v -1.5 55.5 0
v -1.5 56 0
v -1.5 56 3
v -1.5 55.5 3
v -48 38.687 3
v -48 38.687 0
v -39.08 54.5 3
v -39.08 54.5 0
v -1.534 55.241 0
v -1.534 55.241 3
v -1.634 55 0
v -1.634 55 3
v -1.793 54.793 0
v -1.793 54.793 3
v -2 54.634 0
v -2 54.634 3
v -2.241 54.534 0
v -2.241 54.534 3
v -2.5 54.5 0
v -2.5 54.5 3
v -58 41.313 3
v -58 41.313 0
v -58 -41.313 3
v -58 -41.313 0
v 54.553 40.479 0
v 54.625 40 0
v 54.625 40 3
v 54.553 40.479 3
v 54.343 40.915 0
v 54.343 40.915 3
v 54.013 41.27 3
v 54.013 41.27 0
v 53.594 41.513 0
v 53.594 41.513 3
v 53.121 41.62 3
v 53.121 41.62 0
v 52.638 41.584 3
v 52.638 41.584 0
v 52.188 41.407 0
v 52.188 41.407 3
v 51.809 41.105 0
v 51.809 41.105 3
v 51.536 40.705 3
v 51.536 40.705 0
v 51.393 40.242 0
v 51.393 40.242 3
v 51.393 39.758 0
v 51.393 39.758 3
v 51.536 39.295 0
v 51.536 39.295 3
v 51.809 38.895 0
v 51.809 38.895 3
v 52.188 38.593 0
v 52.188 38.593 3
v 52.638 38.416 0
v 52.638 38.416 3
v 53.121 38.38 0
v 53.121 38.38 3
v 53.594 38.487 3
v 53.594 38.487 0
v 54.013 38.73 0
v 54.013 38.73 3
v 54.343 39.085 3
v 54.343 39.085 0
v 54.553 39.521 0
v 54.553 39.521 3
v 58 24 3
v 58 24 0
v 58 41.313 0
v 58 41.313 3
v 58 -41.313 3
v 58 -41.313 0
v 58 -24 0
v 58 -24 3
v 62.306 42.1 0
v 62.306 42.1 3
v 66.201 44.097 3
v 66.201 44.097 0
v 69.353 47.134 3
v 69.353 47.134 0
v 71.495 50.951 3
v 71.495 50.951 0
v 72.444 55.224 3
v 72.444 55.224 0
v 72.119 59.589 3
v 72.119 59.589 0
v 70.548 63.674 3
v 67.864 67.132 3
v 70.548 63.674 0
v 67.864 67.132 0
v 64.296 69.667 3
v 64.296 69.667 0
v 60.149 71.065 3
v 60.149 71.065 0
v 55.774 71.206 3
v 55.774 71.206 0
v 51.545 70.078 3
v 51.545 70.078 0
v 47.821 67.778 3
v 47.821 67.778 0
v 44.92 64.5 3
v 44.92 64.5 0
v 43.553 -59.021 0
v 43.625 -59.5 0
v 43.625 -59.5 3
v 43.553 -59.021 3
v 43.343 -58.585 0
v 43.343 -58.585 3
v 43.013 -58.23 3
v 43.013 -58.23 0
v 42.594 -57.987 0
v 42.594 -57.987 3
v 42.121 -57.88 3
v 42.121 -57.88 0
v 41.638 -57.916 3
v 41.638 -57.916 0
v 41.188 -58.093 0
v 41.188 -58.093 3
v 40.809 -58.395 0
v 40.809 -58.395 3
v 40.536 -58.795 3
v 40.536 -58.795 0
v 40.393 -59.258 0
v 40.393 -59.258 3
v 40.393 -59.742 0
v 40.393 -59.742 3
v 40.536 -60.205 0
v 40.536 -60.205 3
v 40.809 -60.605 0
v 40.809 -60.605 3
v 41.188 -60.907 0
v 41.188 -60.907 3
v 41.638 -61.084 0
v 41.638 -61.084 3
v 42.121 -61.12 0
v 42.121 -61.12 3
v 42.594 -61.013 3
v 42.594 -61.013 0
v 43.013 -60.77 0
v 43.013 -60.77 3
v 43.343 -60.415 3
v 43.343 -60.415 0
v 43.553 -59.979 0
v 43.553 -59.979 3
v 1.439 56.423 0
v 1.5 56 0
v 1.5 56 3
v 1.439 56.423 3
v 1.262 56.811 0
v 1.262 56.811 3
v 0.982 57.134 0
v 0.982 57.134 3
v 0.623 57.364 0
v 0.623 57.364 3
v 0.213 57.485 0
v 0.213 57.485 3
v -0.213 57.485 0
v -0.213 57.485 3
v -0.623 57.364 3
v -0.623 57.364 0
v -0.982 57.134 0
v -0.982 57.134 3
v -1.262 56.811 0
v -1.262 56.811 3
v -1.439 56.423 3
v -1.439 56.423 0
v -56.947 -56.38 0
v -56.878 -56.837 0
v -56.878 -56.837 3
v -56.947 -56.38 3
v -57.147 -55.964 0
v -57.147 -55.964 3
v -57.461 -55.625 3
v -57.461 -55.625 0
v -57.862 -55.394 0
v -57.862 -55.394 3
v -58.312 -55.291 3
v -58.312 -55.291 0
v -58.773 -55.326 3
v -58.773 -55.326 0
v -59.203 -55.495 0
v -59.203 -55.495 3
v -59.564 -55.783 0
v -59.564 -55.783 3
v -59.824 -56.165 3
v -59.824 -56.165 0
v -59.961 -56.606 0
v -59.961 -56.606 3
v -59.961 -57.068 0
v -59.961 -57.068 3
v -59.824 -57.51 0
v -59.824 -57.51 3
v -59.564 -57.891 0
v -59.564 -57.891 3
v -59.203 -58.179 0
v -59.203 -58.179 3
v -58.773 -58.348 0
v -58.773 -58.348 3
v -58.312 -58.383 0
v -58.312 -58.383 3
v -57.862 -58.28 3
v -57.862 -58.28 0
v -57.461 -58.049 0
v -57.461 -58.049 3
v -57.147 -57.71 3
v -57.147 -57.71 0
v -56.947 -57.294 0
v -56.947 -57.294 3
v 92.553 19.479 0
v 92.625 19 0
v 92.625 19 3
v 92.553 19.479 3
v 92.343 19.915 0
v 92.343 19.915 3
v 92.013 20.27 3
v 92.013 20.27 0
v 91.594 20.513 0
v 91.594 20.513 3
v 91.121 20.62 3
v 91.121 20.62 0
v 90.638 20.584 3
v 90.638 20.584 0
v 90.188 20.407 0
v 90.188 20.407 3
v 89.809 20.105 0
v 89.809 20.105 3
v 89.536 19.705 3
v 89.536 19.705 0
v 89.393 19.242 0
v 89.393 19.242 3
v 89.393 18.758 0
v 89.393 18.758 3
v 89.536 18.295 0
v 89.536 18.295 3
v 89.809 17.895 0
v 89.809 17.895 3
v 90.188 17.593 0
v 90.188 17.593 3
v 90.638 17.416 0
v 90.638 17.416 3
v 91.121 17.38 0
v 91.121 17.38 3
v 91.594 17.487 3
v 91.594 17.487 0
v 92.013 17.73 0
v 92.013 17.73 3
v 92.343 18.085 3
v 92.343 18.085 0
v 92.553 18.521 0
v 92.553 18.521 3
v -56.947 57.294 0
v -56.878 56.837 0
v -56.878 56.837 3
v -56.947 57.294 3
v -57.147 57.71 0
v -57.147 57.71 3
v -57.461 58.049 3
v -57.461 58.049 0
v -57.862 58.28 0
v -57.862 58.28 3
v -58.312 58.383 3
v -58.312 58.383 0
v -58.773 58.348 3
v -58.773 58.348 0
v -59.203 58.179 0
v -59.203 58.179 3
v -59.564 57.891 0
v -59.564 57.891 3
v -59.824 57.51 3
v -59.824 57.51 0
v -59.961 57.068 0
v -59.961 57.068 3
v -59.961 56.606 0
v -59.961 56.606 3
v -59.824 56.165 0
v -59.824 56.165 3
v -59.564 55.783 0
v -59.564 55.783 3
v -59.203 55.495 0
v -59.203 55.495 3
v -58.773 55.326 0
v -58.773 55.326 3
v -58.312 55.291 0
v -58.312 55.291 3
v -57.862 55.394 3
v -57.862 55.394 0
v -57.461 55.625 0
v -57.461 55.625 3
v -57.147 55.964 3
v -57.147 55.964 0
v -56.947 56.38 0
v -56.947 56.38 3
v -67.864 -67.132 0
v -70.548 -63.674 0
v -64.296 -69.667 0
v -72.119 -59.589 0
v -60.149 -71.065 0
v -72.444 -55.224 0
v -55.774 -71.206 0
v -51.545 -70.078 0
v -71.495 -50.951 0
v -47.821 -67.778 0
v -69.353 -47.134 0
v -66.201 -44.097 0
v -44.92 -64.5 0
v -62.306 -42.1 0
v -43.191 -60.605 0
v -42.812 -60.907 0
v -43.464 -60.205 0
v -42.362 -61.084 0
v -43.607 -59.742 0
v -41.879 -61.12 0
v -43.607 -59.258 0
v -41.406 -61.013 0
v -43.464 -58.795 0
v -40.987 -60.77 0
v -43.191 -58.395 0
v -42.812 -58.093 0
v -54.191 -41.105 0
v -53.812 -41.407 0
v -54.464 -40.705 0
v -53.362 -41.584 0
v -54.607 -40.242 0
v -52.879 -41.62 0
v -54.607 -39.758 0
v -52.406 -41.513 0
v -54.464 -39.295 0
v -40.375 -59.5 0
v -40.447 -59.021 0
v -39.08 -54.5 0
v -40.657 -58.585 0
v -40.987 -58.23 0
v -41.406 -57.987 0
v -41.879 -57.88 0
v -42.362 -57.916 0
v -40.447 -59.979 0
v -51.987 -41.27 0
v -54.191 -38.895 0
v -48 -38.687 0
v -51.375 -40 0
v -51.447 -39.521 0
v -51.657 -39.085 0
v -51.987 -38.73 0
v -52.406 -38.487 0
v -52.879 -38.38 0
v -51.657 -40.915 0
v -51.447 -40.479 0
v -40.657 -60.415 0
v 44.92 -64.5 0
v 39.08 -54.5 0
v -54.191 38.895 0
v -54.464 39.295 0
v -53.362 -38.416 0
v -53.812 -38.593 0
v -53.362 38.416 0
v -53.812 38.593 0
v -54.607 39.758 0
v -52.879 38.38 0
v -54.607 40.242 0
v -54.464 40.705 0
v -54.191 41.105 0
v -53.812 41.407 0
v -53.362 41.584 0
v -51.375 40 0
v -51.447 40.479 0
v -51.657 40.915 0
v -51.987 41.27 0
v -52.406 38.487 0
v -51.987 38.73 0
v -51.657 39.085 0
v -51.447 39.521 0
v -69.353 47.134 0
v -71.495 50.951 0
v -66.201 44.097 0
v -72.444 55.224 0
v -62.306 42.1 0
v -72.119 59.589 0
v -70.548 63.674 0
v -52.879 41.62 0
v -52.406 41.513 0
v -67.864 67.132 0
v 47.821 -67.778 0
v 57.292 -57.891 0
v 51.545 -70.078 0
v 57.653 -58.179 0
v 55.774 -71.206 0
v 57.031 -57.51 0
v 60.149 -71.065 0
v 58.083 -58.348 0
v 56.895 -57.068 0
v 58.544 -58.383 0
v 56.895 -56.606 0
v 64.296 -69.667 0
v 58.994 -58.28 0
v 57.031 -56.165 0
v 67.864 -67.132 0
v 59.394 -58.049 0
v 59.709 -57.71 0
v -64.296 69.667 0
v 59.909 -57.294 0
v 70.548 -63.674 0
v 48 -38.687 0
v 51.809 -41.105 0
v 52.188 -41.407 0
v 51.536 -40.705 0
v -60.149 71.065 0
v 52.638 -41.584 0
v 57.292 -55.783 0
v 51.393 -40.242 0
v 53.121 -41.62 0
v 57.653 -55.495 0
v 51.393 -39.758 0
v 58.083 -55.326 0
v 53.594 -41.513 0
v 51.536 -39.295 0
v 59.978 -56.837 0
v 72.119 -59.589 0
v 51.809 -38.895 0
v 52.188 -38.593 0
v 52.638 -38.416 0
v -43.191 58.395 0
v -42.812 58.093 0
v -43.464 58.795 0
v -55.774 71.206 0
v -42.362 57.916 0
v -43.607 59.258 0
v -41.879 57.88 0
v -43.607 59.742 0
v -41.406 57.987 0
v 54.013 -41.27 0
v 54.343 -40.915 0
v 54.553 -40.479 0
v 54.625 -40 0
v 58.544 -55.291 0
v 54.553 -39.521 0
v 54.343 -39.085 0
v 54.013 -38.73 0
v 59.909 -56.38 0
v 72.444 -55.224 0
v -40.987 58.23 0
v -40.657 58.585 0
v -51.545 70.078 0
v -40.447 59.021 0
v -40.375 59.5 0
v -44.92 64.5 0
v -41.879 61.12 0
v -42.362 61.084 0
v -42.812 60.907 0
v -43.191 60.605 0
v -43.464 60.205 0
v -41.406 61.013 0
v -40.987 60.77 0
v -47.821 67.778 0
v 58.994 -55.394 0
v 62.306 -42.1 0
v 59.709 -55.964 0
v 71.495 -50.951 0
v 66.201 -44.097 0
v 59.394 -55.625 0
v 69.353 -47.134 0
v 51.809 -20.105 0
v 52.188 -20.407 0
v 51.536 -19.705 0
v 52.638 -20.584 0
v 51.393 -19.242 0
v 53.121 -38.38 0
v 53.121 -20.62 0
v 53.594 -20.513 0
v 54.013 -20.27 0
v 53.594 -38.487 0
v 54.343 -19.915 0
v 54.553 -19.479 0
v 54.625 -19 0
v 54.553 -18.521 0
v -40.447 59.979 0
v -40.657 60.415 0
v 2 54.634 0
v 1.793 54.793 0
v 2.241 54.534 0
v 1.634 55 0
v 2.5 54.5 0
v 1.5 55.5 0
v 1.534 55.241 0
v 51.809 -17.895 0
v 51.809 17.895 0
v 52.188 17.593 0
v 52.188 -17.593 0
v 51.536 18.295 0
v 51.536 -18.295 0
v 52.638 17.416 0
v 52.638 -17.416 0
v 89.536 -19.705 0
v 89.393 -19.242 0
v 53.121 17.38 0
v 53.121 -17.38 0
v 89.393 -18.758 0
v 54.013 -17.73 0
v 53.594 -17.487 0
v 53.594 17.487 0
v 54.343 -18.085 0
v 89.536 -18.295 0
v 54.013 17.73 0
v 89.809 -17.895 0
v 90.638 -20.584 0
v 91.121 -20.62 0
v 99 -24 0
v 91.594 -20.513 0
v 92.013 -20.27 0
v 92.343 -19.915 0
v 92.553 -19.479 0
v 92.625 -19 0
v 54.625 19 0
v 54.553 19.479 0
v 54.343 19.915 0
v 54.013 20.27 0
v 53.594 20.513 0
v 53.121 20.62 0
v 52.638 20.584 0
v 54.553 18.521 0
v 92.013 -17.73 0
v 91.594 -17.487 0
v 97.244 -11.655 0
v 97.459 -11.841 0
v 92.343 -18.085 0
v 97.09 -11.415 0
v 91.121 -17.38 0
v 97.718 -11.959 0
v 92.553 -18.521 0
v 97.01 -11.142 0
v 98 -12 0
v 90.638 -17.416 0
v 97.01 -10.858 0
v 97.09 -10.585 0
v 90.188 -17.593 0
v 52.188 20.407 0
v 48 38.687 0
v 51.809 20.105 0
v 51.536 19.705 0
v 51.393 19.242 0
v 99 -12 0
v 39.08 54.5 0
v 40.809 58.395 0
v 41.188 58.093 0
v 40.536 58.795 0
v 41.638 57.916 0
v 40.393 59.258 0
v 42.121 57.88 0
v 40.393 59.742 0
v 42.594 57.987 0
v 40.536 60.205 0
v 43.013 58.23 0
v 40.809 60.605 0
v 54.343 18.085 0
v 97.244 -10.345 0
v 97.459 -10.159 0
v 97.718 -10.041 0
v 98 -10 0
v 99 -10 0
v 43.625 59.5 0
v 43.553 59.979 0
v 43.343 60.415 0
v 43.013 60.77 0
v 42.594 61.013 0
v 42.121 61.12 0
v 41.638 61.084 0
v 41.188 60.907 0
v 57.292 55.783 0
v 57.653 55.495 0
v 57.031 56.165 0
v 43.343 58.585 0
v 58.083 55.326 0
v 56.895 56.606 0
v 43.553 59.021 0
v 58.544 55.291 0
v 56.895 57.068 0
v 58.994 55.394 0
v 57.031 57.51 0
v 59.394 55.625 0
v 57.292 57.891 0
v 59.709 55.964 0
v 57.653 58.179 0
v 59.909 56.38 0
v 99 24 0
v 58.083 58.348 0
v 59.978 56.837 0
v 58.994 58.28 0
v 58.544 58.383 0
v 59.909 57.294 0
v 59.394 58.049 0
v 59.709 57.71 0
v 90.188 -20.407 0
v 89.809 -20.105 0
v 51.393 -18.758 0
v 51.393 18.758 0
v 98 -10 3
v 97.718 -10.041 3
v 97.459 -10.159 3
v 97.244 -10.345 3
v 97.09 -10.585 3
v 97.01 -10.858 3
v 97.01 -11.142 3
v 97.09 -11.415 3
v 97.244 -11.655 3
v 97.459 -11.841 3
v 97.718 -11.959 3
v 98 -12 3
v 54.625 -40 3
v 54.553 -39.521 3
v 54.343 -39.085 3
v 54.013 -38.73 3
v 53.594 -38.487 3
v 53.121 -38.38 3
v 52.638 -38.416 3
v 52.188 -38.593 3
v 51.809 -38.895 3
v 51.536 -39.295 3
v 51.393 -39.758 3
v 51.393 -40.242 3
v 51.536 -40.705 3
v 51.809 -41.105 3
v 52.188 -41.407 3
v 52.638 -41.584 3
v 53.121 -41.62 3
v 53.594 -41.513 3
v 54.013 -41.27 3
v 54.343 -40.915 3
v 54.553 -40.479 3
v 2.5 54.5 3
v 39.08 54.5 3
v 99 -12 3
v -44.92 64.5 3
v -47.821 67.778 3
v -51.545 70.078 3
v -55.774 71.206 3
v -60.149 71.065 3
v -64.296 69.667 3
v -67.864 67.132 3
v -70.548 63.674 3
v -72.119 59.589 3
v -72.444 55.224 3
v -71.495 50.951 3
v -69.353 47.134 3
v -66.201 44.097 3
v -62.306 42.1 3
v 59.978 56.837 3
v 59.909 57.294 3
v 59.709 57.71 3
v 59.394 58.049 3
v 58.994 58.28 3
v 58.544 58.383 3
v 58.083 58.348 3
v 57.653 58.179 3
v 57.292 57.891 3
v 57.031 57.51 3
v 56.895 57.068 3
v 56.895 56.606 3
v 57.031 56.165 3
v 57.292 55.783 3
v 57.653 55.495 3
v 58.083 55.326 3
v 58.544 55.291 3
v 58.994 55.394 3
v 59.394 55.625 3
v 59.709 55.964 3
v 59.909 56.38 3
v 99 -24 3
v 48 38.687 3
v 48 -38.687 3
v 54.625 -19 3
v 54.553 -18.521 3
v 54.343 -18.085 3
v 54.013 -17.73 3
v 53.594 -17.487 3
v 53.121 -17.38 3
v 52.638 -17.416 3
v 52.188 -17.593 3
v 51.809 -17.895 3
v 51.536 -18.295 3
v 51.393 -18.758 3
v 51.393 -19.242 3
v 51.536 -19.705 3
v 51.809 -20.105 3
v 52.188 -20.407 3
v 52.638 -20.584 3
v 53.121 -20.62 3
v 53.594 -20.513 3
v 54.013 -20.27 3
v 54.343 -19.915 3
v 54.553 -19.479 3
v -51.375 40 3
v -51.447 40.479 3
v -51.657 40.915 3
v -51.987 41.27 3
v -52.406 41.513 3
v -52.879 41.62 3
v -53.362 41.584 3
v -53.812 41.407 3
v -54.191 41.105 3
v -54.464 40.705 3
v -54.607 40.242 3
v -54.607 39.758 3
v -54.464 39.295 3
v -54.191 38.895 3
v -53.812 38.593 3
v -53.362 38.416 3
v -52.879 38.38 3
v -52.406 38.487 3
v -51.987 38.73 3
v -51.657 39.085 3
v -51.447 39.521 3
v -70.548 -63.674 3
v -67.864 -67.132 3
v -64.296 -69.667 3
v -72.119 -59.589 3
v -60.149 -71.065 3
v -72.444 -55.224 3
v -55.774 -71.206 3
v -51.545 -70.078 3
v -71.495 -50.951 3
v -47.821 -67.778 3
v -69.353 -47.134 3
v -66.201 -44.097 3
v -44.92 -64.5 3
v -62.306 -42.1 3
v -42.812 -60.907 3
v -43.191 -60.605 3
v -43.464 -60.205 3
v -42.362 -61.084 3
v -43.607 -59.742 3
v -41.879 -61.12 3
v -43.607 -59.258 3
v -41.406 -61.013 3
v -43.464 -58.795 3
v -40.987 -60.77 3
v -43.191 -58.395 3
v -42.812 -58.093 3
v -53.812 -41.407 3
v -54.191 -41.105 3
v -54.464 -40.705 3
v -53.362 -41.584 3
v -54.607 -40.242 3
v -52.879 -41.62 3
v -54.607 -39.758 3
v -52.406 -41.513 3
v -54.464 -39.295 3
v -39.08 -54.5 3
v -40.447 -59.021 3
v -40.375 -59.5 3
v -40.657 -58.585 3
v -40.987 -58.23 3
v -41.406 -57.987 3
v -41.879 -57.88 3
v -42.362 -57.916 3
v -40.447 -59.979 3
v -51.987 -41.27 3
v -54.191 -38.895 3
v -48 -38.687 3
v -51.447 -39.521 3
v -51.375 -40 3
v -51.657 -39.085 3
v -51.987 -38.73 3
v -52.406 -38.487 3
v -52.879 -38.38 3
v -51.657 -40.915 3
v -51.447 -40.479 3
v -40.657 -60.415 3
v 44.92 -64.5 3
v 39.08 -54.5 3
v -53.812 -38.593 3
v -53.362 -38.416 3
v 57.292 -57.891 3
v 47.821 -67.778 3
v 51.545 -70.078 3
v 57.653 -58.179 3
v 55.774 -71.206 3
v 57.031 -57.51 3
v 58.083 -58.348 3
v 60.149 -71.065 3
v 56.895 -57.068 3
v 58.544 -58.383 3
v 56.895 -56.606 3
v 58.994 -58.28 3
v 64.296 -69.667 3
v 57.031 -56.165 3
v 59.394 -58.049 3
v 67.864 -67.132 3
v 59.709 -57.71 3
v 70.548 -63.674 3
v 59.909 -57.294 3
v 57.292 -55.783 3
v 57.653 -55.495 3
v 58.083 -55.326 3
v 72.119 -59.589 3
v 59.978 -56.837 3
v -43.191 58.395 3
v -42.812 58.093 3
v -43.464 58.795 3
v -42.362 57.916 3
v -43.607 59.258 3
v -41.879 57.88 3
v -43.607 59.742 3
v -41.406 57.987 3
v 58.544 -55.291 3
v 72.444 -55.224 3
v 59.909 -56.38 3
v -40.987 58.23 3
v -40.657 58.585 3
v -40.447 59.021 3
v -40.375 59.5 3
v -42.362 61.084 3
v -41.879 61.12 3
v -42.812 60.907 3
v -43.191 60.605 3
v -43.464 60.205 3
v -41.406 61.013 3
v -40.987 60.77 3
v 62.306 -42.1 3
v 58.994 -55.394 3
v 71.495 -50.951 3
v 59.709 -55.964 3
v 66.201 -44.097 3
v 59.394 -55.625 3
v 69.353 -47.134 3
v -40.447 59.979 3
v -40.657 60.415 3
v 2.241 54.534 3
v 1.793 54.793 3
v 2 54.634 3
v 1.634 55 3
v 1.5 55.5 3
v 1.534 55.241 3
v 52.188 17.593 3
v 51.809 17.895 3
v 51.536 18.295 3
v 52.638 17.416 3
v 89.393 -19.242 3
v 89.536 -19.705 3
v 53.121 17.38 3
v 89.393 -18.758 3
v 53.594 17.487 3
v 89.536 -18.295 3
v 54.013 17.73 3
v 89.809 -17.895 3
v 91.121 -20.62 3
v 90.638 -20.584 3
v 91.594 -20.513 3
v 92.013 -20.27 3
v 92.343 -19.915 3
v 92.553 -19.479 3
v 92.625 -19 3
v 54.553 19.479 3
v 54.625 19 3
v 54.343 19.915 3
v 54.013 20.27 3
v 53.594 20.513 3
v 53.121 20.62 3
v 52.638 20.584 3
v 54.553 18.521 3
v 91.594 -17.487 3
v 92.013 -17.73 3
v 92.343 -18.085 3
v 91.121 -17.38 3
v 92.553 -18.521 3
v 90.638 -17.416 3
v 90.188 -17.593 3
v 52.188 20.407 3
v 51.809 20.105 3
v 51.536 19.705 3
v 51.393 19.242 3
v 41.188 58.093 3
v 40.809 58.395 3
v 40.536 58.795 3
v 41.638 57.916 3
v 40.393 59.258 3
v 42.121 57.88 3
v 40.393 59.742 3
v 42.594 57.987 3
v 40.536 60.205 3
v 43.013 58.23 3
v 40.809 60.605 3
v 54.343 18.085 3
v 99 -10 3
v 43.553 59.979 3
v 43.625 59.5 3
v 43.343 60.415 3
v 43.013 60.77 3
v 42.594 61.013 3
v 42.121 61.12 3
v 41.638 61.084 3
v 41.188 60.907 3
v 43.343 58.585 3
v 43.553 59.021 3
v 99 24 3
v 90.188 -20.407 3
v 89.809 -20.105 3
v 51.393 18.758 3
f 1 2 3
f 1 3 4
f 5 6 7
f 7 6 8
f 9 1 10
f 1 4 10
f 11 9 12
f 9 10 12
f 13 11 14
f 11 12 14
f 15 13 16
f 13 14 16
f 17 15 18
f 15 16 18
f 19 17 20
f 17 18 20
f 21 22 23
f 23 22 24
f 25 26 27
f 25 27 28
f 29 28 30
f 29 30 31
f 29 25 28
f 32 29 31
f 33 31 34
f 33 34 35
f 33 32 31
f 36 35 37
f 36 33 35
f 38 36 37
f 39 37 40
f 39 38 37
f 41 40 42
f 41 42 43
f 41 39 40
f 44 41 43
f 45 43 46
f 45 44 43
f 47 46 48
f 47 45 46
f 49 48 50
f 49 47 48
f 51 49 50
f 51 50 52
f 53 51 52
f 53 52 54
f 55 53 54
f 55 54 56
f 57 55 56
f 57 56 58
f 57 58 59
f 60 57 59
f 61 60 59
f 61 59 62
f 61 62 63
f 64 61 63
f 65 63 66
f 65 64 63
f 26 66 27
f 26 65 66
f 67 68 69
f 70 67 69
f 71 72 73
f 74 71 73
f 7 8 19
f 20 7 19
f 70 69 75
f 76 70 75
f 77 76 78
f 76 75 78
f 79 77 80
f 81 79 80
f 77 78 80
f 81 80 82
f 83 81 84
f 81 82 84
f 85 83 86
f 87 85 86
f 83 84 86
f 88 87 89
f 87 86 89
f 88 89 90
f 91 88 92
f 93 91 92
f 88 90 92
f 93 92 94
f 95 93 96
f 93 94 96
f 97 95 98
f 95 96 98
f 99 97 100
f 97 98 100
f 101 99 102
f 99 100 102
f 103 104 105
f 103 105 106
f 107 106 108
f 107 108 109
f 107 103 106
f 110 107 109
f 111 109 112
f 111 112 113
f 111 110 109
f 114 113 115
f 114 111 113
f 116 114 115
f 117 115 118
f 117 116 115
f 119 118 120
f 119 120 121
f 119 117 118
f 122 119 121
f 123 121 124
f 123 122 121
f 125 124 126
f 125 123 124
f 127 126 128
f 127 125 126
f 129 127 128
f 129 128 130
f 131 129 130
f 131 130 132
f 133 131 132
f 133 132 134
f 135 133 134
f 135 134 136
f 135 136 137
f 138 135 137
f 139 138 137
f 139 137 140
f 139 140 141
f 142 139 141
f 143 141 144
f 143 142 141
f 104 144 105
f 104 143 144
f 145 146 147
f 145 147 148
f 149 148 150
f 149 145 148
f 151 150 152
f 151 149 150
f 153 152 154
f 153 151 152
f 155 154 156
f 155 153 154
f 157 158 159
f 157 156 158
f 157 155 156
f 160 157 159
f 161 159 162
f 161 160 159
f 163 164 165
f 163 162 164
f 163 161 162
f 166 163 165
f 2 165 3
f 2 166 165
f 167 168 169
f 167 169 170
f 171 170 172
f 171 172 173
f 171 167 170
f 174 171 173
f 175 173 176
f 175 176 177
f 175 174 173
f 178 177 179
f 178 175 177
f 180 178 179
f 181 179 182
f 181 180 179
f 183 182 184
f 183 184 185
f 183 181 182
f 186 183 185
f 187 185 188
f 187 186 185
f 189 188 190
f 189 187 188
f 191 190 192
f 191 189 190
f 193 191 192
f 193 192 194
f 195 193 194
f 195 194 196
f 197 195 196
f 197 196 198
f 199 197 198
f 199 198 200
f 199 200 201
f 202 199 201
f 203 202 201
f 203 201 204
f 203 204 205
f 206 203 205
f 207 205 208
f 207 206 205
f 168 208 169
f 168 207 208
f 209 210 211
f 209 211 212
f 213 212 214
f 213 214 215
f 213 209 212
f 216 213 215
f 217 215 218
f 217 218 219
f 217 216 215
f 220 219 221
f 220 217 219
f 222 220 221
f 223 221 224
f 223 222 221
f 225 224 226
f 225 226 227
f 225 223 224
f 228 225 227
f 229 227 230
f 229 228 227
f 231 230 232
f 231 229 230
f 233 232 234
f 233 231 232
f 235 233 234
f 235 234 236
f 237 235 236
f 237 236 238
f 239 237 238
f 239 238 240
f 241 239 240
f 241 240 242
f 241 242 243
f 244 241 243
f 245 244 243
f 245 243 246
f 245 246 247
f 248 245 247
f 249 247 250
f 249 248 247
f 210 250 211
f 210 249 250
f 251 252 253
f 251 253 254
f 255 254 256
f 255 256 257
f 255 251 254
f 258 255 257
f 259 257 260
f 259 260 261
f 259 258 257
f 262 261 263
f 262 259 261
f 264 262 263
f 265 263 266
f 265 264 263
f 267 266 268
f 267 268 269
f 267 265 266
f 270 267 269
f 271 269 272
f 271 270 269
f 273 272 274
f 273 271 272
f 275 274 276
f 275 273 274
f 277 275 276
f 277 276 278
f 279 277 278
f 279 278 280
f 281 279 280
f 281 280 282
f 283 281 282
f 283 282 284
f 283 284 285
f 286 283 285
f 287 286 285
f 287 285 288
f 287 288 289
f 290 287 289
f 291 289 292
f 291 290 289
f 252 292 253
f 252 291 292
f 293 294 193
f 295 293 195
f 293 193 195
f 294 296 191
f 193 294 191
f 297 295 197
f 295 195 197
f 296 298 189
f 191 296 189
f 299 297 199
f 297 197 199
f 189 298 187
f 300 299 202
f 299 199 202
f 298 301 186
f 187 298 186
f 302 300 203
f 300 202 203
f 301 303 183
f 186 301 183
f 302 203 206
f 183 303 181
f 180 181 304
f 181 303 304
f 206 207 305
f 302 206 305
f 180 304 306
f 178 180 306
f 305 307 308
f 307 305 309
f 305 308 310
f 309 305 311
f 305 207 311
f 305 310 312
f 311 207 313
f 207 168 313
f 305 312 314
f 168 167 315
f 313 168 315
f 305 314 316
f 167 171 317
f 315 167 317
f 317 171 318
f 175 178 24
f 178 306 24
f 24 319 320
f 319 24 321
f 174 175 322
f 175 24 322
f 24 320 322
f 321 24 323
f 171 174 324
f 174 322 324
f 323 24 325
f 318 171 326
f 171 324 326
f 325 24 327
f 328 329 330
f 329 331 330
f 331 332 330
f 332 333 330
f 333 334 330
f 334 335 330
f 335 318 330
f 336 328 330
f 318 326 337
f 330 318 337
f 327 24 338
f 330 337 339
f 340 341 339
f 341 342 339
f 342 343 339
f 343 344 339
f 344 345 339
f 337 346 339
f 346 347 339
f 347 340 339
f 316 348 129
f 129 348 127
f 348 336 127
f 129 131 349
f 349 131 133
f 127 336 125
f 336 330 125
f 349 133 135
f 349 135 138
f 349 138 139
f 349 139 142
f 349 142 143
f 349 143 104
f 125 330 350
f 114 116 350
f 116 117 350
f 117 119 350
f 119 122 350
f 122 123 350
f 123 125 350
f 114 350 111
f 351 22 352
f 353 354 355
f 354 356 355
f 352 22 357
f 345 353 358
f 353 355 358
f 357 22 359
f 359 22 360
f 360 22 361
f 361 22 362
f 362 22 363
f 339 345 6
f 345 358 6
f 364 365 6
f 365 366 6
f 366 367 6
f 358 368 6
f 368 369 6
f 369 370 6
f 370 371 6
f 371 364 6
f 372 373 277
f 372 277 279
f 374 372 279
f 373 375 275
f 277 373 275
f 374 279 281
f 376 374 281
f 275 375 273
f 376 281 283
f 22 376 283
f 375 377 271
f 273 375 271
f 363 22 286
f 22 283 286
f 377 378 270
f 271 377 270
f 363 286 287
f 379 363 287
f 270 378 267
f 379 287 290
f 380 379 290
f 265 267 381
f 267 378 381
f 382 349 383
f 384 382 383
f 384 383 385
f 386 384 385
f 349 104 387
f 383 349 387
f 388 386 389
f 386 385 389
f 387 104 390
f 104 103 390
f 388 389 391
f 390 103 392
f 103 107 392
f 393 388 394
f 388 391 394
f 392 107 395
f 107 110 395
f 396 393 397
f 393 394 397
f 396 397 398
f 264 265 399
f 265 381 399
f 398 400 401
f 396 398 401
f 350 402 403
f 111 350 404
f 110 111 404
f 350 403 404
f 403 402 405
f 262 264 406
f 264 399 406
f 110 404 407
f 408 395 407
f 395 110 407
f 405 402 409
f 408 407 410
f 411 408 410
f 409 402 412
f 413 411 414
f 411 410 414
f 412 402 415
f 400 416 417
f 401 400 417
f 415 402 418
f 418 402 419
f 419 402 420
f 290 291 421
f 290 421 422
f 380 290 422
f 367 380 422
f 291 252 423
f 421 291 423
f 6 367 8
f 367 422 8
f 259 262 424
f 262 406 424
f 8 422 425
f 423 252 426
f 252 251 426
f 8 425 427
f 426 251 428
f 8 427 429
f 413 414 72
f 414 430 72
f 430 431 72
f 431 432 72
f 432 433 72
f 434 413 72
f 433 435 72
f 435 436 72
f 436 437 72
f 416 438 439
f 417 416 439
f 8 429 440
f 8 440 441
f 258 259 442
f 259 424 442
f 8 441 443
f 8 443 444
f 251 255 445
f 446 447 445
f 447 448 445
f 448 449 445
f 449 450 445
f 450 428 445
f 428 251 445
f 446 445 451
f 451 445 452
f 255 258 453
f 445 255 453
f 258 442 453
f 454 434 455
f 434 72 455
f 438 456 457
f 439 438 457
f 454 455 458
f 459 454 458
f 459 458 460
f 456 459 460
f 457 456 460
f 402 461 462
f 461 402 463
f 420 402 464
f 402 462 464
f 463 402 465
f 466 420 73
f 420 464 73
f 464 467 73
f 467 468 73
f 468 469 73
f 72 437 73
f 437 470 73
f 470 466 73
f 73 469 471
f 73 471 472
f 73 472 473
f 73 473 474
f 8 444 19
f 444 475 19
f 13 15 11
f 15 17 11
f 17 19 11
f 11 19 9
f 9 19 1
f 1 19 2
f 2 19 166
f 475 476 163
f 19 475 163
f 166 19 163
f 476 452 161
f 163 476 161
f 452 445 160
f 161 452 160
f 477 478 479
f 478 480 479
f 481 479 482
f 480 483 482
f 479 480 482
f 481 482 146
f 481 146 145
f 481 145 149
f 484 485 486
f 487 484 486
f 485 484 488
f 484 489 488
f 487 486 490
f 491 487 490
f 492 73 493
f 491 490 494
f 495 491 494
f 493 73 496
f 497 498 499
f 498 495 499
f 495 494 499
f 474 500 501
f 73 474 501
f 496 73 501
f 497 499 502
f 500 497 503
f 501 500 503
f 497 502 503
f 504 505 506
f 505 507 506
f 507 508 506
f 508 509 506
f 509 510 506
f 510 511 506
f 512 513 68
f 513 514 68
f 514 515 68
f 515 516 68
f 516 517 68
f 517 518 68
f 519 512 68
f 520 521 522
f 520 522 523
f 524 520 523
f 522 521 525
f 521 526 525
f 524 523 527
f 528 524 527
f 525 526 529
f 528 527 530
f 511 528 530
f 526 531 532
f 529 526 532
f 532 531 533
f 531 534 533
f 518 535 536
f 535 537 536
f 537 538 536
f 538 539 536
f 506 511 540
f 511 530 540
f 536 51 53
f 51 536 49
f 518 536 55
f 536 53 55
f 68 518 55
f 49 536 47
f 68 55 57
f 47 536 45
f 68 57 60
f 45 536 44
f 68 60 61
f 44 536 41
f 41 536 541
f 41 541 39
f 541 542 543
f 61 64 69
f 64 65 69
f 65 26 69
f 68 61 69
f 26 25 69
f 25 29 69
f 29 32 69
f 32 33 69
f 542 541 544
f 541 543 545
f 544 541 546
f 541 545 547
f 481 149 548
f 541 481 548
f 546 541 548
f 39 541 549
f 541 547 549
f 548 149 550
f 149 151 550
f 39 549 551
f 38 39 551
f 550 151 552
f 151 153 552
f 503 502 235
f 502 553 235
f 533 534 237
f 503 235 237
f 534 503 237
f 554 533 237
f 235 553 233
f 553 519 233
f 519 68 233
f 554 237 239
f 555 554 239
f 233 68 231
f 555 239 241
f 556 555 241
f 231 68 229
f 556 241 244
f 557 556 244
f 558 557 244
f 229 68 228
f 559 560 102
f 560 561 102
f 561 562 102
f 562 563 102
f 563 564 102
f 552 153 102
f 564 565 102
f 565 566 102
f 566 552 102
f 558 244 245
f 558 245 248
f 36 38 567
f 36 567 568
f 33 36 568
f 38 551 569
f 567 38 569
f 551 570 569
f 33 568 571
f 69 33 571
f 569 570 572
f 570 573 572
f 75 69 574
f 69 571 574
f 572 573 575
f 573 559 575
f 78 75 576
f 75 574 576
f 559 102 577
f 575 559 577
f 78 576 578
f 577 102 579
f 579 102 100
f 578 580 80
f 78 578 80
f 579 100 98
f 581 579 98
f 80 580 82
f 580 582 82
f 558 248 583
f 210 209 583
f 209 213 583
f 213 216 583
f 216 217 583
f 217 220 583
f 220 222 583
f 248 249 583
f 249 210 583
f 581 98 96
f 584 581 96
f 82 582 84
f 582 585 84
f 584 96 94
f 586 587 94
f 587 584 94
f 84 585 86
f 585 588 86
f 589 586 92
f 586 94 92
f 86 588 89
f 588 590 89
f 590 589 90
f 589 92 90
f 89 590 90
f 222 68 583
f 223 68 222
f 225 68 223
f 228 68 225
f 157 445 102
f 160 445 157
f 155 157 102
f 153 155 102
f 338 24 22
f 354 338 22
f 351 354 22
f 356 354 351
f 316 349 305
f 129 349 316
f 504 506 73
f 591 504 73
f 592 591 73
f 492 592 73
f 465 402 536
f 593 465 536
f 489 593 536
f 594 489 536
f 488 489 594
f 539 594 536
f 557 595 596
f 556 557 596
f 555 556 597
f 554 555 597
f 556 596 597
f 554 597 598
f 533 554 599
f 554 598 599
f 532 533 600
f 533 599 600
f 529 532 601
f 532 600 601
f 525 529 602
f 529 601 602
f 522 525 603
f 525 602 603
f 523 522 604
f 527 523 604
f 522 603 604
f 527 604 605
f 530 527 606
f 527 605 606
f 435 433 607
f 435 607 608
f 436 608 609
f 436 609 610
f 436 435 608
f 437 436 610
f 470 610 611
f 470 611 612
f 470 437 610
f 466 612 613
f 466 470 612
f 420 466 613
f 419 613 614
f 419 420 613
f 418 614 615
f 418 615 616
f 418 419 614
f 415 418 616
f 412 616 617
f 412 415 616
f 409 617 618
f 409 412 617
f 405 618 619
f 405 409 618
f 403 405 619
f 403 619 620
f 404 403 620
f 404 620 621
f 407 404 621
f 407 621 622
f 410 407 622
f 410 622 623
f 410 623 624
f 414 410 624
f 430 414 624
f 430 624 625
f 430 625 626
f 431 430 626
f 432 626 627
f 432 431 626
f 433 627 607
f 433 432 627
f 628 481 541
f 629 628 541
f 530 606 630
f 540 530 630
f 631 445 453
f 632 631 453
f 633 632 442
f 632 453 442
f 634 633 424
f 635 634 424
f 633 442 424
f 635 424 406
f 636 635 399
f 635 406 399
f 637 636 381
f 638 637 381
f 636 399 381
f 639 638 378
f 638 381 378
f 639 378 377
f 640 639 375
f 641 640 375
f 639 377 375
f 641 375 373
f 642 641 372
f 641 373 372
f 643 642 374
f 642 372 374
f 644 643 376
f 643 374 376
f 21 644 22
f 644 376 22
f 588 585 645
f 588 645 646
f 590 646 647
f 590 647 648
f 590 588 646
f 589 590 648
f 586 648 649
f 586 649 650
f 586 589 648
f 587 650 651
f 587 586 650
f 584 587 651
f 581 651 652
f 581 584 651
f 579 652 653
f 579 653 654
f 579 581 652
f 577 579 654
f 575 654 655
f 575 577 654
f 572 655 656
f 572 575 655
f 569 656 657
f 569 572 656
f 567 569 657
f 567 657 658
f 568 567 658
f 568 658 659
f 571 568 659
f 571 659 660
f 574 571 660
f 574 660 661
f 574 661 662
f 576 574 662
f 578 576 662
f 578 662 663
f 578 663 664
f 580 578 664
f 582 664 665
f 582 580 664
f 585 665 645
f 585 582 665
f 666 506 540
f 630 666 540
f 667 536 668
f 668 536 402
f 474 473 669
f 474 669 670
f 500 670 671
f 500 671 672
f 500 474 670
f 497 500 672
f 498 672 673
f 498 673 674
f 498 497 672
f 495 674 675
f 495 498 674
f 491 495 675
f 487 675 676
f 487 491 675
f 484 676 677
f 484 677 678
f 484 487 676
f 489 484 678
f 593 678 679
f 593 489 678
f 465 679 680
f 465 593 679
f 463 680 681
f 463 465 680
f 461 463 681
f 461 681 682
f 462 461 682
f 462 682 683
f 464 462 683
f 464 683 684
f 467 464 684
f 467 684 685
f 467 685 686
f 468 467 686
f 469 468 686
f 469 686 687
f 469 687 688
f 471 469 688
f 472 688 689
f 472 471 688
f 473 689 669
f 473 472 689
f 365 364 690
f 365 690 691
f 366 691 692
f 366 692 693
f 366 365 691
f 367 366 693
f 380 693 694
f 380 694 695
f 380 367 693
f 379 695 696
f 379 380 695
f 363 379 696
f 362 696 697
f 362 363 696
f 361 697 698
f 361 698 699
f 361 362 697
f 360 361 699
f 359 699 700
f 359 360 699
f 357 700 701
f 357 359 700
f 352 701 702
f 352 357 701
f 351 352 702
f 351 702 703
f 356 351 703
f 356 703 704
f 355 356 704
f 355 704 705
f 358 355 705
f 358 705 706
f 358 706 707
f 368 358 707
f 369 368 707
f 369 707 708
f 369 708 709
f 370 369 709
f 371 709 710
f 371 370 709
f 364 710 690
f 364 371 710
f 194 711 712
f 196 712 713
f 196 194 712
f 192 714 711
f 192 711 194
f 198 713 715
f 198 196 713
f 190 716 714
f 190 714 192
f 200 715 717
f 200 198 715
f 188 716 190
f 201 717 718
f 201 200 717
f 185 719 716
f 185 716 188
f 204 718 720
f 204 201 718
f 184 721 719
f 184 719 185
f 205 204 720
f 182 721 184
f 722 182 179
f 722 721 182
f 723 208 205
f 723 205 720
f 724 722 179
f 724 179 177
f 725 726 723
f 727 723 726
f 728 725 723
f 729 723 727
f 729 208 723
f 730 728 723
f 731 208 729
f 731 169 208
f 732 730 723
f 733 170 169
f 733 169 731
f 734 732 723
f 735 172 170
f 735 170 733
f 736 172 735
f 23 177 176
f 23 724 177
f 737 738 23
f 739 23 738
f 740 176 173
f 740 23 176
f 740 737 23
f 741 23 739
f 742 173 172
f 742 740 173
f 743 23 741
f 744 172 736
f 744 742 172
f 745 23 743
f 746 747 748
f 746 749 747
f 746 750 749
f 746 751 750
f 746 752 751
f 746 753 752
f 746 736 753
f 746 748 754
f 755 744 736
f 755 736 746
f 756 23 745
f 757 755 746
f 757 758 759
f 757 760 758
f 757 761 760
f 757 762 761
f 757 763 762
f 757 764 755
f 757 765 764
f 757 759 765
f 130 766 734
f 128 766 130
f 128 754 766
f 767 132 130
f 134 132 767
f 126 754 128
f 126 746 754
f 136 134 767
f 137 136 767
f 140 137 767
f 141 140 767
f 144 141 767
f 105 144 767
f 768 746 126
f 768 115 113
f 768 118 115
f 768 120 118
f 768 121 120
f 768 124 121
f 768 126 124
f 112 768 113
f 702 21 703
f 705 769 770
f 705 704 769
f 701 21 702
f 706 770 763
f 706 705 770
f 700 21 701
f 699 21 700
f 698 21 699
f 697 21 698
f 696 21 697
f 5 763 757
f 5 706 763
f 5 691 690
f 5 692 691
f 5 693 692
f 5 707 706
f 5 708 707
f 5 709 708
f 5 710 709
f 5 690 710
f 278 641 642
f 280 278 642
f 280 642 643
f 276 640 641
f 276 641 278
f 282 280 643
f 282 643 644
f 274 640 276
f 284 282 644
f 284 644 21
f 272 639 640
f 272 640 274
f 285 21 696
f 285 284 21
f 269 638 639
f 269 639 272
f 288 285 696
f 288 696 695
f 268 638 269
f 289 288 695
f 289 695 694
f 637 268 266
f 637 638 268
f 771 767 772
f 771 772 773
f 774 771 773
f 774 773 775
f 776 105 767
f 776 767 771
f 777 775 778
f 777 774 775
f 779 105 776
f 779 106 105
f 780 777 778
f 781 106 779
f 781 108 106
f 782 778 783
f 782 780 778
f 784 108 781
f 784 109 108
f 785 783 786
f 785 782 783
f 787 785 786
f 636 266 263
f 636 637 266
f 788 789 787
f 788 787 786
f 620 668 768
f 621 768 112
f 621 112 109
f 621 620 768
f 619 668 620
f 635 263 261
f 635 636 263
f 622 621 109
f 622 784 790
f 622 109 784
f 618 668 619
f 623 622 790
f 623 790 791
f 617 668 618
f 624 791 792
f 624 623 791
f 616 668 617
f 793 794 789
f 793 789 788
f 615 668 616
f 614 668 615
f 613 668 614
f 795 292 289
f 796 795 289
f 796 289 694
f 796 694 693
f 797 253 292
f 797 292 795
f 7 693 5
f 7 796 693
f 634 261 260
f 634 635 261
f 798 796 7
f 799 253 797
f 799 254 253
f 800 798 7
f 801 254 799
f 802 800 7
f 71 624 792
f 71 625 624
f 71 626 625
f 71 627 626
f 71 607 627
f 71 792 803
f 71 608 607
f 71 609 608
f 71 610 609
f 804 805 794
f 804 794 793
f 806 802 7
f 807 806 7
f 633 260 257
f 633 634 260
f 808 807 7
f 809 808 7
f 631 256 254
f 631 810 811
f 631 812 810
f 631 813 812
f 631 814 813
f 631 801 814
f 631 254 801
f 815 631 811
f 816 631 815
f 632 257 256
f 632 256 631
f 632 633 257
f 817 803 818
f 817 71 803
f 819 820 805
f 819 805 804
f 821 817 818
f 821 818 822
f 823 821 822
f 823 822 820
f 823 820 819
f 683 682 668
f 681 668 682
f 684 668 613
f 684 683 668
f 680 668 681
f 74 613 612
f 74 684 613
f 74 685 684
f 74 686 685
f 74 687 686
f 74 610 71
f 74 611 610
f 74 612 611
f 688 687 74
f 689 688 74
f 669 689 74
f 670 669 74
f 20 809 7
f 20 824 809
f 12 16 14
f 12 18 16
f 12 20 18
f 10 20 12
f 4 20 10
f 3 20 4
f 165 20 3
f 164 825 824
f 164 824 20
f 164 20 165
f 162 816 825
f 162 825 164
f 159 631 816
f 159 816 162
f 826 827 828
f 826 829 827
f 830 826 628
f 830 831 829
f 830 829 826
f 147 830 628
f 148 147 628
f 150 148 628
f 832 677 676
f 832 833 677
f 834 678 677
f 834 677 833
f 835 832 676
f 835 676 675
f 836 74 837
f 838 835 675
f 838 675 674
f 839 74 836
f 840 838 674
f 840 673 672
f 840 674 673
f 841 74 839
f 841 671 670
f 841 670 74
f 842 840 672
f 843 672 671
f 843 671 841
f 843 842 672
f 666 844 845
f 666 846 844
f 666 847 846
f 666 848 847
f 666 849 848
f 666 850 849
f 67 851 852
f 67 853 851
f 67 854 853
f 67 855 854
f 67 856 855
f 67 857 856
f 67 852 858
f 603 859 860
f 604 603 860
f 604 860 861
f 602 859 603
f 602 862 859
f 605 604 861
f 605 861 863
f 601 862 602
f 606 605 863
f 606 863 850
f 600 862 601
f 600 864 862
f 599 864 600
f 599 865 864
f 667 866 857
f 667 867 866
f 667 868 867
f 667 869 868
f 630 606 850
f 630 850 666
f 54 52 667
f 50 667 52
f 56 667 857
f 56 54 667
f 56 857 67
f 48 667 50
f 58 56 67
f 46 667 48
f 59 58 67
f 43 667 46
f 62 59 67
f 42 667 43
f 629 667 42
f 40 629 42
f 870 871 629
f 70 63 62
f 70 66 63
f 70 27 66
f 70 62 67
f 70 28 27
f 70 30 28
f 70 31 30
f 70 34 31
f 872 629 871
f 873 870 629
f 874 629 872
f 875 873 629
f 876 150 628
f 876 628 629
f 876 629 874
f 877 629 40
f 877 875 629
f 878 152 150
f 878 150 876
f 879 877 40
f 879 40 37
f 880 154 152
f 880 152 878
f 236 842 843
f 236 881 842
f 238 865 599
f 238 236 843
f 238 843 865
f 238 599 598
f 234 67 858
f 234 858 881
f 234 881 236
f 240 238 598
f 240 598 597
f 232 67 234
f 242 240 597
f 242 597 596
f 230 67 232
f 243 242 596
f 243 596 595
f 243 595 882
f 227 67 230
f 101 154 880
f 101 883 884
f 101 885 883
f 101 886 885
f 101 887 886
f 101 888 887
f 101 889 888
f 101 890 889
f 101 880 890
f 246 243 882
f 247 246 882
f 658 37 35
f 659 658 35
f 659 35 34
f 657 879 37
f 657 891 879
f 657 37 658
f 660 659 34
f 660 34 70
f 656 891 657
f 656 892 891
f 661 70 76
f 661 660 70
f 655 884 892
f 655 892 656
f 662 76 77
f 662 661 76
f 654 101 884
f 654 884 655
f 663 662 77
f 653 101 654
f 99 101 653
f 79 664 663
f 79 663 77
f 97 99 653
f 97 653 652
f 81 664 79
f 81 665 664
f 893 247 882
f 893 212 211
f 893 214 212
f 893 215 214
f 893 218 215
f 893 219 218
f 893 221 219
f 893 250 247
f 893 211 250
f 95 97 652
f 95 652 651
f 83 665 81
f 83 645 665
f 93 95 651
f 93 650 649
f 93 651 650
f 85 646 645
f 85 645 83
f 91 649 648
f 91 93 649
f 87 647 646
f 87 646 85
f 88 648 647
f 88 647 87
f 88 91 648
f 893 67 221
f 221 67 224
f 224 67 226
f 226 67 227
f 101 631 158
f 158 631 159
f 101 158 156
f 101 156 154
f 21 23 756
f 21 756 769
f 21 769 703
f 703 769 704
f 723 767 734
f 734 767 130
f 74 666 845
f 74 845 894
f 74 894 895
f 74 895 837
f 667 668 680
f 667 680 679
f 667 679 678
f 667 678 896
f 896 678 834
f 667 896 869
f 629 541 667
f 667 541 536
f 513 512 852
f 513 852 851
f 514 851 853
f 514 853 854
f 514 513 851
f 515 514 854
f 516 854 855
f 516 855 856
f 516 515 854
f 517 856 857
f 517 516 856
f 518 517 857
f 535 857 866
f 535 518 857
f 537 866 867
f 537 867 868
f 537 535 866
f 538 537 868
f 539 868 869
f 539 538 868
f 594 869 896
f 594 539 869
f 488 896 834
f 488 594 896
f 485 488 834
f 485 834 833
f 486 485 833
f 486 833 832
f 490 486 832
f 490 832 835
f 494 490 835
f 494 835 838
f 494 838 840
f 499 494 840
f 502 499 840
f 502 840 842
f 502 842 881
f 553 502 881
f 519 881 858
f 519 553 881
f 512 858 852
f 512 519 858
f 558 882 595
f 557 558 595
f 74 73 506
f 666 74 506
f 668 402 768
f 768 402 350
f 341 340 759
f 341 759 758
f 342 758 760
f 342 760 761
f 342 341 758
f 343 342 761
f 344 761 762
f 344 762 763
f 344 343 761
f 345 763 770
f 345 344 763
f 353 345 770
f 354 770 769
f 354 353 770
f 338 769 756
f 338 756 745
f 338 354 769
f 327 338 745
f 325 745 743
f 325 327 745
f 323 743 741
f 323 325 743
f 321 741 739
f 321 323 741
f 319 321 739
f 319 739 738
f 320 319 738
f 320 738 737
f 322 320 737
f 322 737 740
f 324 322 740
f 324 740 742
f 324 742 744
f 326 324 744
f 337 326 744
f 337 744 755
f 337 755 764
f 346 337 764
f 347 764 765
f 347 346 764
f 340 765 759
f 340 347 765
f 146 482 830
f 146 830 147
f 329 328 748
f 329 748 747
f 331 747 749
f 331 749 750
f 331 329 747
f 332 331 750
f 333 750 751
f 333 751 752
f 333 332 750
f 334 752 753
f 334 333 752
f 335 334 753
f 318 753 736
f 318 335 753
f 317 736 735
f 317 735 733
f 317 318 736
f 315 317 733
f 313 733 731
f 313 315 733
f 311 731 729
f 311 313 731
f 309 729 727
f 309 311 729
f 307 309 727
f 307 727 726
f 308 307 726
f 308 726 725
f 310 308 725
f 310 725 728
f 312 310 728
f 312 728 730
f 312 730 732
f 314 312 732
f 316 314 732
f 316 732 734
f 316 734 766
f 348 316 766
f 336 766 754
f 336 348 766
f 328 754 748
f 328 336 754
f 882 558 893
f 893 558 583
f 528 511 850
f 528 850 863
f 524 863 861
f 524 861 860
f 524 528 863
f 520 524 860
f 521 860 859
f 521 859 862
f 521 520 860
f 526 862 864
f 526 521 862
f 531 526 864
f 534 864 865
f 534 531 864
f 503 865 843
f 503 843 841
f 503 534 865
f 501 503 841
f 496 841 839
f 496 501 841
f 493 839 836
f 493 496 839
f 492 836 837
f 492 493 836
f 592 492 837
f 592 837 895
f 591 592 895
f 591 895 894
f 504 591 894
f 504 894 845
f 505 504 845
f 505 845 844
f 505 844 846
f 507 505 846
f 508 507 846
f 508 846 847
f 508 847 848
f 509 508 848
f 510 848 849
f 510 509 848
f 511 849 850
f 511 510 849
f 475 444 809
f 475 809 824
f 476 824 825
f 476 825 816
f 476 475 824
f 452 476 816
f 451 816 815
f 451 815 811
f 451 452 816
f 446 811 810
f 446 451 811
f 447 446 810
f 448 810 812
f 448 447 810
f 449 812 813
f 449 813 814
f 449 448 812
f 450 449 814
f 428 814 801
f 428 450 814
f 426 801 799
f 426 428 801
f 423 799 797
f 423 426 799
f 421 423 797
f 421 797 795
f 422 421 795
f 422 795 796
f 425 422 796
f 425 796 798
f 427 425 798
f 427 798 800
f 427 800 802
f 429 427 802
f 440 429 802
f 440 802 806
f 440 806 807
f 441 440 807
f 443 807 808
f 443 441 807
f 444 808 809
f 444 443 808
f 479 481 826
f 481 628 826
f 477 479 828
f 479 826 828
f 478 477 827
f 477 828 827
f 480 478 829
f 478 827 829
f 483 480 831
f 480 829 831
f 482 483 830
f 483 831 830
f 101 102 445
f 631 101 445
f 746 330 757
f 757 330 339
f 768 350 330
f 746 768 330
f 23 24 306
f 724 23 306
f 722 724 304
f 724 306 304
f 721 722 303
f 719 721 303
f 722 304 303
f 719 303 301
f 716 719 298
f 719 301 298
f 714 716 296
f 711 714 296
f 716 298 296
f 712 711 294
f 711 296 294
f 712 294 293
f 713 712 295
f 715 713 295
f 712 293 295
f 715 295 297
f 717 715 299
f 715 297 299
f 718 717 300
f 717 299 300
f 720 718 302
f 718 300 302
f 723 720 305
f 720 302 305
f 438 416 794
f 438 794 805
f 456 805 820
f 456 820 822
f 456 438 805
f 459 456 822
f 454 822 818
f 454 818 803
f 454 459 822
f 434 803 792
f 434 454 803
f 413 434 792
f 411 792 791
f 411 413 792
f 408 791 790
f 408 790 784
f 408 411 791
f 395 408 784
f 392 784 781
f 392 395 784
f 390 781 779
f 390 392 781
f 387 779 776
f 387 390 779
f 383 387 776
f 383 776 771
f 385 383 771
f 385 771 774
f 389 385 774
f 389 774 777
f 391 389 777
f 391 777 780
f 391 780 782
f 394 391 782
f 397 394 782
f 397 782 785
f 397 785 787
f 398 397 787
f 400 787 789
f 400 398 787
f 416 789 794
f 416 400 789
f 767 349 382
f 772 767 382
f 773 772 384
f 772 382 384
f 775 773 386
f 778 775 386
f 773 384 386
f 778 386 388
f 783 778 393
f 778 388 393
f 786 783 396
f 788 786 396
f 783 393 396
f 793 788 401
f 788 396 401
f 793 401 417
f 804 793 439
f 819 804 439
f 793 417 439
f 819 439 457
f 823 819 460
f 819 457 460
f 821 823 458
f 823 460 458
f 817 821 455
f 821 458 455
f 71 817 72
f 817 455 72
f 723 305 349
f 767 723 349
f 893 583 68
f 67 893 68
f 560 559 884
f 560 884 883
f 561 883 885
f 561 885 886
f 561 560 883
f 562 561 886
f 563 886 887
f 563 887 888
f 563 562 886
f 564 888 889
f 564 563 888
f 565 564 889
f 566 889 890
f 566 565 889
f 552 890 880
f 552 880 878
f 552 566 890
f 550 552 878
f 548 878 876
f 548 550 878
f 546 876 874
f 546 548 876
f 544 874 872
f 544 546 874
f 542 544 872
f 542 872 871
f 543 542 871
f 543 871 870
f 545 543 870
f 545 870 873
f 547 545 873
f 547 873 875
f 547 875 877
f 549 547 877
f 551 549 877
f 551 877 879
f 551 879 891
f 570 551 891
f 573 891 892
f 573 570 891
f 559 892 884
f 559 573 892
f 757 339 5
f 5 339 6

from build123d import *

# Parameters (mm, degrees)
F0_R     = 1.55
F0_R_2   = 1.625
F1_DEPTH = 3
F2_W     = 28.2
F2_H     = 28.2
F3_DEPTH = 3
F5_DEPTH = 25
F7_DEPTH = 25
F8_R     = 1


with BuildPart() as f1:
    # F0 (on Top) → F1 (new body)
    with BuildSketch(Plane.XY):
        with BuildLine():
            Line((58, 24), (58, 41.313006))
            ThreePointArc((58, 41.313006), (70.547763, 63.673914), (44.920157, 64.5))
            Line((44.920157, 64.5), (0, 64.5))
            Line((0, 64.5), (-44.920157, 64.5))
            ThreePointArc((-44.920157, 64.5), (-70.547763, 63.673914), (-58, 41.313006))
            Line((-58, 41.313006), (-58, 0))
            Line((-58, 0), (-58, -41.313006))
            ThreePointArc((-58, -41.313006), (-70.547763, -63.673914), (-44.920157, -64.5))
            Line((-44.920157, -64.5), (0, -64.5))
            Line((0, -64.5), (44.920157, -64.5))
            ThreePointArc((44.920157, -64.5), (70.547763, -63.673914), (58, -41.313006))
            Line((58, -41.313006), (58, -24))
            Line((58, -24), (99, -24))
            Line((99, -24), (99, 24))
            Line((99, 24), (58, 24))
        make_face()
        with Locations((-58.427906, -56.837072)):
            Circle(F0_R, mode=Mode.SUBTRACT)
        with Locations((-42, -59.5)):
            Circle(F0_R_2, mode=Mode.SUBTRACT)
        with Locations((-53, -40)):
            Circle(F0_R_2, mode=Mode.SUBTRACT)
        with Locations((42, -59.5)):
            Circle(F0_R_2, mode=Mode.SUBTRACT)
        with Locations((53, -40)):
            Circle(F0_R_2, mode=Mode.SUBTRACT)
        with Locations((58.427906, -56.837072)):
            Circle(F0_R, mode=Mode.SUBTRACT)
        with Locations((53, -19)):
            Circle(F0_R_2, mode=Mode.SUBTRACT)
        with Locations((91, -19)):
            Circle(F0_R_2, mode=Mode.SUBTRACT)
        Polygon((39.079843, 54.5), (48, 38.686994), (48, 0), (48, -38.686994), (39.079843, -54.5), (0, -54.5), (-39.079843, -54.5), (-48, -38.686994), (-48, 0), (-48, 38.686994), (-39.079843, 54.5), (0, 54.5), align=None, mode=Mode.SUBTRACT)
        with Locations((-53, 40)):
            Circle(F0_R_2, mode=Mode.SUBTRACT)
        with Locations((-58.427906, 56.837072)):
            Circle(F0_R, mode=Mode.SUBTRACT)
        with Locations((-42, 59.5)):
            Circle(F0_R_2, mode=Mode.SUBTRACT)
        with Locations((53, 19)):
            Circle(F0_R_2, mode=Mode.SUBTRACT)
        Polygon((86, 14), (86, -14), (58, -14), (58, 0), (58, 14), align=None, mode=Mode.SUBTRACT)
        with Locations((91, 19)):
            Circle(F0_R_2, mode=Mode.SUBTRACT)
        with Locations((53, 40)):
            Circle(F0_R_2, mode=Mode.SUBTRACT)
        with Locations((42, 59.5)):
            Circle(F0_R_2, mode=Mode.SUBTRACT)
        with Locations((58.427906, 56.837072)):
            Circle(F0_R, mode=Mode.SUBTRACT)
    extrude(amount=F1_DEPTH)

    # F2 (on Top) → F3 (join)
    with BuildSketch(Plane.XY):
        with Locations((72, 0)):
            Rectangle(F2_W, F2_H)
    extrude(amount=F3_DEPTH)

    # F4 (on face) → F5 (cut)
    with BuildSketch(Plane.XY.offset(3)):
        with BuildLine():
            Line((99, -10), (98, -10))
            ThreePointArc((98, -10), (97, -11), (98, -12))
            Line((98, -12), (99, -12))
            Line((99, -12), (99, -10))
        make_face()
    extrude(amount=-F5_DEPTH, mode=Mode.SUBTRACT)

    # F6 (on Top) → F7 (cut)
    with BuildSketch(Plane.XY):
        with BuildLine():
            Line((1.5, 54.5), (1.5, 56))
            ThreePointArc((1.5, 56), (0, 57.5), (-1.5, 56))
            Line((-1.5, 56), (-1.5, 54.5))
            Line((-1.5, 54.5), (1.5, 54.5))
        make_face()
    extrude(amount=F7_DEPTH, mode=Mode.SUBTRACT)

    # F8
    f8_edges = [f1.edges().sort_by_distance(p)[0] for p in [
        (-1.5, 54.5, 1.5),
        (1.5, 54.5, 1.5),
    ]]
    fillet(f8_edges, radius=F8_R)


solid = f1.part
